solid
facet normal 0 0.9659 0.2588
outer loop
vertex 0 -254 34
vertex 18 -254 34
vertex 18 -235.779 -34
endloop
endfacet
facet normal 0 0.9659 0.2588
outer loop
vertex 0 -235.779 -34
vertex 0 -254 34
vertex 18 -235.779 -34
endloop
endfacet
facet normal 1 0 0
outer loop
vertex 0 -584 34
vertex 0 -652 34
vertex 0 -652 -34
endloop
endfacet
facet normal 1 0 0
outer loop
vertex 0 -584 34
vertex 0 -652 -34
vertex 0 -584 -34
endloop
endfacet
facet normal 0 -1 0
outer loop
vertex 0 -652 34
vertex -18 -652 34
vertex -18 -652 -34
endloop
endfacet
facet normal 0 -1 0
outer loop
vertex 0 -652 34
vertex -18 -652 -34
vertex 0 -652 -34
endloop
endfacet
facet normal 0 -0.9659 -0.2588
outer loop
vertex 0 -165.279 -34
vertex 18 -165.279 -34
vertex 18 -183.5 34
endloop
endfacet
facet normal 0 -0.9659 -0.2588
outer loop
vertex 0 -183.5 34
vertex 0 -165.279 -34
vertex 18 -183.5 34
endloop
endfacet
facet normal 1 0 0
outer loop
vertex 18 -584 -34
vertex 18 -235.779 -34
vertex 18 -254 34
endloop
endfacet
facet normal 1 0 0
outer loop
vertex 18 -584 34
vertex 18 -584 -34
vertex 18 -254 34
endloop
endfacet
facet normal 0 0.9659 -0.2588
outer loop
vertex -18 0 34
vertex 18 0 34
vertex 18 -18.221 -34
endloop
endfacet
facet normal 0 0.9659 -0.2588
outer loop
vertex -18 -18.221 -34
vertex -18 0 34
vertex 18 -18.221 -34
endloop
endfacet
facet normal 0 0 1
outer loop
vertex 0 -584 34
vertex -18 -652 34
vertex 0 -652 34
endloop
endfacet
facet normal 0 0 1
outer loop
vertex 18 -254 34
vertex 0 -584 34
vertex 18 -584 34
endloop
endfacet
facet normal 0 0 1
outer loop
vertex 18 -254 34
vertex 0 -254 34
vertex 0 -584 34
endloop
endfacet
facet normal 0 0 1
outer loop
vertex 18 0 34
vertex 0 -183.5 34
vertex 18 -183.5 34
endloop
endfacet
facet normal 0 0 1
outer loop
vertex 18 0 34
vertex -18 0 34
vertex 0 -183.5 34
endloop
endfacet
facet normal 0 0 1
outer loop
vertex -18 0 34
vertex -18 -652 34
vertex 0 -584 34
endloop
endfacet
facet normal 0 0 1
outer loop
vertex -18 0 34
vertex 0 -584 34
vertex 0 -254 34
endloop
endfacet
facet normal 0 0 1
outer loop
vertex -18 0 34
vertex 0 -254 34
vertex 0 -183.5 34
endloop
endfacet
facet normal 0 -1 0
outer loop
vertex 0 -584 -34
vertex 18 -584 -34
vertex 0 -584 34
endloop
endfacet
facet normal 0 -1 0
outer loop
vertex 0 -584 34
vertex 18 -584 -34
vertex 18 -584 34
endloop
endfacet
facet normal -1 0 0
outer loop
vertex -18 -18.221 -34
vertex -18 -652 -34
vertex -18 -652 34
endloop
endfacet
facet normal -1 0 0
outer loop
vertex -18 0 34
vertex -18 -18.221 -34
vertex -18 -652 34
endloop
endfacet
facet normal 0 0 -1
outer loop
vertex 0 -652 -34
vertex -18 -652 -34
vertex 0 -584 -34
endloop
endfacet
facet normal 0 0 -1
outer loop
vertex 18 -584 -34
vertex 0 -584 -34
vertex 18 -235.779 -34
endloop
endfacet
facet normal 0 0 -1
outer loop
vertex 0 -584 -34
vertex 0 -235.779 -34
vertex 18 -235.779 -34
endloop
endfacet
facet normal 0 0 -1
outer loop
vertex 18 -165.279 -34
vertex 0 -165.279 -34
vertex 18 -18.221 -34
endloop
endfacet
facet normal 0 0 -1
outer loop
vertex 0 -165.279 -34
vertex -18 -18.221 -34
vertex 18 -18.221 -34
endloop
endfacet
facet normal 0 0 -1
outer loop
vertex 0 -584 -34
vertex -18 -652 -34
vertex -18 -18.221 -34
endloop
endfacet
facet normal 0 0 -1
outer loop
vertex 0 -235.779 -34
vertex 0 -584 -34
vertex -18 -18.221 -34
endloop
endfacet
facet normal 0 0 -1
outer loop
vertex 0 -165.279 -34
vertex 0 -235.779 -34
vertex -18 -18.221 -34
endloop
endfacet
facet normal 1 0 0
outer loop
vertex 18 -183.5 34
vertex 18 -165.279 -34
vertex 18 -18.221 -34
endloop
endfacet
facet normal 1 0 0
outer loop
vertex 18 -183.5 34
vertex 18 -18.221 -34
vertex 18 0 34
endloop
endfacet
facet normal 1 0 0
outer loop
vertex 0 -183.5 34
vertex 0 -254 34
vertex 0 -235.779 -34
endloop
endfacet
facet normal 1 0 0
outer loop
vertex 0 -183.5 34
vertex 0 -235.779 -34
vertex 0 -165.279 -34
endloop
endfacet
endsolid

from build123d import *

# Parameters (mm, degrees)
F0_W     = 36
F0_H     = 68
F1_DEPTH = 652
F3_DEPTH = 36
F4_W     = 68
F4_H     = 68
F5_DEPTH = 18
F7_DEPTH = 18


with BuildPart() as f1:
    # F0 (on Front) → F1 (new body)
    with BuildSketch(Plane.XZ):
        Rectangle(F0_W, F0_H)
    extrude(amount=F1_DEPTH)

    # F2 (on face) → F3 (cut, through all)
    with BuildSketch(Plane.YZ.offset(18)):
        Polygon((0, -34), (0, 34), (-18.220545, -34), align=None)
    extrude(amount=-F3_DEPTH, mode=Mode.SUBTRACT)

    # F4 (on face) → F5 (cut)
    with BuildSketch(Plane.YZ.offset(18)):
        with Locations((-618, 0)):
            Rectangle(F4_W, F4_H)
    extrude(amount=-F5_DEPTH, mode=Mode.SUBTRACT)

    # F6 (on face) → F7 (cut)
    with BuildSketch(Plane.YZ.offset(18)):
        Polygon((-183.5, 34), (-254, 34), (-235.779455, -34), (-165.279455, -34), align=None)
    extrude(amount=-F7_DEPTH, mode=Mode.SUBTRACT)


solid = f1.part
